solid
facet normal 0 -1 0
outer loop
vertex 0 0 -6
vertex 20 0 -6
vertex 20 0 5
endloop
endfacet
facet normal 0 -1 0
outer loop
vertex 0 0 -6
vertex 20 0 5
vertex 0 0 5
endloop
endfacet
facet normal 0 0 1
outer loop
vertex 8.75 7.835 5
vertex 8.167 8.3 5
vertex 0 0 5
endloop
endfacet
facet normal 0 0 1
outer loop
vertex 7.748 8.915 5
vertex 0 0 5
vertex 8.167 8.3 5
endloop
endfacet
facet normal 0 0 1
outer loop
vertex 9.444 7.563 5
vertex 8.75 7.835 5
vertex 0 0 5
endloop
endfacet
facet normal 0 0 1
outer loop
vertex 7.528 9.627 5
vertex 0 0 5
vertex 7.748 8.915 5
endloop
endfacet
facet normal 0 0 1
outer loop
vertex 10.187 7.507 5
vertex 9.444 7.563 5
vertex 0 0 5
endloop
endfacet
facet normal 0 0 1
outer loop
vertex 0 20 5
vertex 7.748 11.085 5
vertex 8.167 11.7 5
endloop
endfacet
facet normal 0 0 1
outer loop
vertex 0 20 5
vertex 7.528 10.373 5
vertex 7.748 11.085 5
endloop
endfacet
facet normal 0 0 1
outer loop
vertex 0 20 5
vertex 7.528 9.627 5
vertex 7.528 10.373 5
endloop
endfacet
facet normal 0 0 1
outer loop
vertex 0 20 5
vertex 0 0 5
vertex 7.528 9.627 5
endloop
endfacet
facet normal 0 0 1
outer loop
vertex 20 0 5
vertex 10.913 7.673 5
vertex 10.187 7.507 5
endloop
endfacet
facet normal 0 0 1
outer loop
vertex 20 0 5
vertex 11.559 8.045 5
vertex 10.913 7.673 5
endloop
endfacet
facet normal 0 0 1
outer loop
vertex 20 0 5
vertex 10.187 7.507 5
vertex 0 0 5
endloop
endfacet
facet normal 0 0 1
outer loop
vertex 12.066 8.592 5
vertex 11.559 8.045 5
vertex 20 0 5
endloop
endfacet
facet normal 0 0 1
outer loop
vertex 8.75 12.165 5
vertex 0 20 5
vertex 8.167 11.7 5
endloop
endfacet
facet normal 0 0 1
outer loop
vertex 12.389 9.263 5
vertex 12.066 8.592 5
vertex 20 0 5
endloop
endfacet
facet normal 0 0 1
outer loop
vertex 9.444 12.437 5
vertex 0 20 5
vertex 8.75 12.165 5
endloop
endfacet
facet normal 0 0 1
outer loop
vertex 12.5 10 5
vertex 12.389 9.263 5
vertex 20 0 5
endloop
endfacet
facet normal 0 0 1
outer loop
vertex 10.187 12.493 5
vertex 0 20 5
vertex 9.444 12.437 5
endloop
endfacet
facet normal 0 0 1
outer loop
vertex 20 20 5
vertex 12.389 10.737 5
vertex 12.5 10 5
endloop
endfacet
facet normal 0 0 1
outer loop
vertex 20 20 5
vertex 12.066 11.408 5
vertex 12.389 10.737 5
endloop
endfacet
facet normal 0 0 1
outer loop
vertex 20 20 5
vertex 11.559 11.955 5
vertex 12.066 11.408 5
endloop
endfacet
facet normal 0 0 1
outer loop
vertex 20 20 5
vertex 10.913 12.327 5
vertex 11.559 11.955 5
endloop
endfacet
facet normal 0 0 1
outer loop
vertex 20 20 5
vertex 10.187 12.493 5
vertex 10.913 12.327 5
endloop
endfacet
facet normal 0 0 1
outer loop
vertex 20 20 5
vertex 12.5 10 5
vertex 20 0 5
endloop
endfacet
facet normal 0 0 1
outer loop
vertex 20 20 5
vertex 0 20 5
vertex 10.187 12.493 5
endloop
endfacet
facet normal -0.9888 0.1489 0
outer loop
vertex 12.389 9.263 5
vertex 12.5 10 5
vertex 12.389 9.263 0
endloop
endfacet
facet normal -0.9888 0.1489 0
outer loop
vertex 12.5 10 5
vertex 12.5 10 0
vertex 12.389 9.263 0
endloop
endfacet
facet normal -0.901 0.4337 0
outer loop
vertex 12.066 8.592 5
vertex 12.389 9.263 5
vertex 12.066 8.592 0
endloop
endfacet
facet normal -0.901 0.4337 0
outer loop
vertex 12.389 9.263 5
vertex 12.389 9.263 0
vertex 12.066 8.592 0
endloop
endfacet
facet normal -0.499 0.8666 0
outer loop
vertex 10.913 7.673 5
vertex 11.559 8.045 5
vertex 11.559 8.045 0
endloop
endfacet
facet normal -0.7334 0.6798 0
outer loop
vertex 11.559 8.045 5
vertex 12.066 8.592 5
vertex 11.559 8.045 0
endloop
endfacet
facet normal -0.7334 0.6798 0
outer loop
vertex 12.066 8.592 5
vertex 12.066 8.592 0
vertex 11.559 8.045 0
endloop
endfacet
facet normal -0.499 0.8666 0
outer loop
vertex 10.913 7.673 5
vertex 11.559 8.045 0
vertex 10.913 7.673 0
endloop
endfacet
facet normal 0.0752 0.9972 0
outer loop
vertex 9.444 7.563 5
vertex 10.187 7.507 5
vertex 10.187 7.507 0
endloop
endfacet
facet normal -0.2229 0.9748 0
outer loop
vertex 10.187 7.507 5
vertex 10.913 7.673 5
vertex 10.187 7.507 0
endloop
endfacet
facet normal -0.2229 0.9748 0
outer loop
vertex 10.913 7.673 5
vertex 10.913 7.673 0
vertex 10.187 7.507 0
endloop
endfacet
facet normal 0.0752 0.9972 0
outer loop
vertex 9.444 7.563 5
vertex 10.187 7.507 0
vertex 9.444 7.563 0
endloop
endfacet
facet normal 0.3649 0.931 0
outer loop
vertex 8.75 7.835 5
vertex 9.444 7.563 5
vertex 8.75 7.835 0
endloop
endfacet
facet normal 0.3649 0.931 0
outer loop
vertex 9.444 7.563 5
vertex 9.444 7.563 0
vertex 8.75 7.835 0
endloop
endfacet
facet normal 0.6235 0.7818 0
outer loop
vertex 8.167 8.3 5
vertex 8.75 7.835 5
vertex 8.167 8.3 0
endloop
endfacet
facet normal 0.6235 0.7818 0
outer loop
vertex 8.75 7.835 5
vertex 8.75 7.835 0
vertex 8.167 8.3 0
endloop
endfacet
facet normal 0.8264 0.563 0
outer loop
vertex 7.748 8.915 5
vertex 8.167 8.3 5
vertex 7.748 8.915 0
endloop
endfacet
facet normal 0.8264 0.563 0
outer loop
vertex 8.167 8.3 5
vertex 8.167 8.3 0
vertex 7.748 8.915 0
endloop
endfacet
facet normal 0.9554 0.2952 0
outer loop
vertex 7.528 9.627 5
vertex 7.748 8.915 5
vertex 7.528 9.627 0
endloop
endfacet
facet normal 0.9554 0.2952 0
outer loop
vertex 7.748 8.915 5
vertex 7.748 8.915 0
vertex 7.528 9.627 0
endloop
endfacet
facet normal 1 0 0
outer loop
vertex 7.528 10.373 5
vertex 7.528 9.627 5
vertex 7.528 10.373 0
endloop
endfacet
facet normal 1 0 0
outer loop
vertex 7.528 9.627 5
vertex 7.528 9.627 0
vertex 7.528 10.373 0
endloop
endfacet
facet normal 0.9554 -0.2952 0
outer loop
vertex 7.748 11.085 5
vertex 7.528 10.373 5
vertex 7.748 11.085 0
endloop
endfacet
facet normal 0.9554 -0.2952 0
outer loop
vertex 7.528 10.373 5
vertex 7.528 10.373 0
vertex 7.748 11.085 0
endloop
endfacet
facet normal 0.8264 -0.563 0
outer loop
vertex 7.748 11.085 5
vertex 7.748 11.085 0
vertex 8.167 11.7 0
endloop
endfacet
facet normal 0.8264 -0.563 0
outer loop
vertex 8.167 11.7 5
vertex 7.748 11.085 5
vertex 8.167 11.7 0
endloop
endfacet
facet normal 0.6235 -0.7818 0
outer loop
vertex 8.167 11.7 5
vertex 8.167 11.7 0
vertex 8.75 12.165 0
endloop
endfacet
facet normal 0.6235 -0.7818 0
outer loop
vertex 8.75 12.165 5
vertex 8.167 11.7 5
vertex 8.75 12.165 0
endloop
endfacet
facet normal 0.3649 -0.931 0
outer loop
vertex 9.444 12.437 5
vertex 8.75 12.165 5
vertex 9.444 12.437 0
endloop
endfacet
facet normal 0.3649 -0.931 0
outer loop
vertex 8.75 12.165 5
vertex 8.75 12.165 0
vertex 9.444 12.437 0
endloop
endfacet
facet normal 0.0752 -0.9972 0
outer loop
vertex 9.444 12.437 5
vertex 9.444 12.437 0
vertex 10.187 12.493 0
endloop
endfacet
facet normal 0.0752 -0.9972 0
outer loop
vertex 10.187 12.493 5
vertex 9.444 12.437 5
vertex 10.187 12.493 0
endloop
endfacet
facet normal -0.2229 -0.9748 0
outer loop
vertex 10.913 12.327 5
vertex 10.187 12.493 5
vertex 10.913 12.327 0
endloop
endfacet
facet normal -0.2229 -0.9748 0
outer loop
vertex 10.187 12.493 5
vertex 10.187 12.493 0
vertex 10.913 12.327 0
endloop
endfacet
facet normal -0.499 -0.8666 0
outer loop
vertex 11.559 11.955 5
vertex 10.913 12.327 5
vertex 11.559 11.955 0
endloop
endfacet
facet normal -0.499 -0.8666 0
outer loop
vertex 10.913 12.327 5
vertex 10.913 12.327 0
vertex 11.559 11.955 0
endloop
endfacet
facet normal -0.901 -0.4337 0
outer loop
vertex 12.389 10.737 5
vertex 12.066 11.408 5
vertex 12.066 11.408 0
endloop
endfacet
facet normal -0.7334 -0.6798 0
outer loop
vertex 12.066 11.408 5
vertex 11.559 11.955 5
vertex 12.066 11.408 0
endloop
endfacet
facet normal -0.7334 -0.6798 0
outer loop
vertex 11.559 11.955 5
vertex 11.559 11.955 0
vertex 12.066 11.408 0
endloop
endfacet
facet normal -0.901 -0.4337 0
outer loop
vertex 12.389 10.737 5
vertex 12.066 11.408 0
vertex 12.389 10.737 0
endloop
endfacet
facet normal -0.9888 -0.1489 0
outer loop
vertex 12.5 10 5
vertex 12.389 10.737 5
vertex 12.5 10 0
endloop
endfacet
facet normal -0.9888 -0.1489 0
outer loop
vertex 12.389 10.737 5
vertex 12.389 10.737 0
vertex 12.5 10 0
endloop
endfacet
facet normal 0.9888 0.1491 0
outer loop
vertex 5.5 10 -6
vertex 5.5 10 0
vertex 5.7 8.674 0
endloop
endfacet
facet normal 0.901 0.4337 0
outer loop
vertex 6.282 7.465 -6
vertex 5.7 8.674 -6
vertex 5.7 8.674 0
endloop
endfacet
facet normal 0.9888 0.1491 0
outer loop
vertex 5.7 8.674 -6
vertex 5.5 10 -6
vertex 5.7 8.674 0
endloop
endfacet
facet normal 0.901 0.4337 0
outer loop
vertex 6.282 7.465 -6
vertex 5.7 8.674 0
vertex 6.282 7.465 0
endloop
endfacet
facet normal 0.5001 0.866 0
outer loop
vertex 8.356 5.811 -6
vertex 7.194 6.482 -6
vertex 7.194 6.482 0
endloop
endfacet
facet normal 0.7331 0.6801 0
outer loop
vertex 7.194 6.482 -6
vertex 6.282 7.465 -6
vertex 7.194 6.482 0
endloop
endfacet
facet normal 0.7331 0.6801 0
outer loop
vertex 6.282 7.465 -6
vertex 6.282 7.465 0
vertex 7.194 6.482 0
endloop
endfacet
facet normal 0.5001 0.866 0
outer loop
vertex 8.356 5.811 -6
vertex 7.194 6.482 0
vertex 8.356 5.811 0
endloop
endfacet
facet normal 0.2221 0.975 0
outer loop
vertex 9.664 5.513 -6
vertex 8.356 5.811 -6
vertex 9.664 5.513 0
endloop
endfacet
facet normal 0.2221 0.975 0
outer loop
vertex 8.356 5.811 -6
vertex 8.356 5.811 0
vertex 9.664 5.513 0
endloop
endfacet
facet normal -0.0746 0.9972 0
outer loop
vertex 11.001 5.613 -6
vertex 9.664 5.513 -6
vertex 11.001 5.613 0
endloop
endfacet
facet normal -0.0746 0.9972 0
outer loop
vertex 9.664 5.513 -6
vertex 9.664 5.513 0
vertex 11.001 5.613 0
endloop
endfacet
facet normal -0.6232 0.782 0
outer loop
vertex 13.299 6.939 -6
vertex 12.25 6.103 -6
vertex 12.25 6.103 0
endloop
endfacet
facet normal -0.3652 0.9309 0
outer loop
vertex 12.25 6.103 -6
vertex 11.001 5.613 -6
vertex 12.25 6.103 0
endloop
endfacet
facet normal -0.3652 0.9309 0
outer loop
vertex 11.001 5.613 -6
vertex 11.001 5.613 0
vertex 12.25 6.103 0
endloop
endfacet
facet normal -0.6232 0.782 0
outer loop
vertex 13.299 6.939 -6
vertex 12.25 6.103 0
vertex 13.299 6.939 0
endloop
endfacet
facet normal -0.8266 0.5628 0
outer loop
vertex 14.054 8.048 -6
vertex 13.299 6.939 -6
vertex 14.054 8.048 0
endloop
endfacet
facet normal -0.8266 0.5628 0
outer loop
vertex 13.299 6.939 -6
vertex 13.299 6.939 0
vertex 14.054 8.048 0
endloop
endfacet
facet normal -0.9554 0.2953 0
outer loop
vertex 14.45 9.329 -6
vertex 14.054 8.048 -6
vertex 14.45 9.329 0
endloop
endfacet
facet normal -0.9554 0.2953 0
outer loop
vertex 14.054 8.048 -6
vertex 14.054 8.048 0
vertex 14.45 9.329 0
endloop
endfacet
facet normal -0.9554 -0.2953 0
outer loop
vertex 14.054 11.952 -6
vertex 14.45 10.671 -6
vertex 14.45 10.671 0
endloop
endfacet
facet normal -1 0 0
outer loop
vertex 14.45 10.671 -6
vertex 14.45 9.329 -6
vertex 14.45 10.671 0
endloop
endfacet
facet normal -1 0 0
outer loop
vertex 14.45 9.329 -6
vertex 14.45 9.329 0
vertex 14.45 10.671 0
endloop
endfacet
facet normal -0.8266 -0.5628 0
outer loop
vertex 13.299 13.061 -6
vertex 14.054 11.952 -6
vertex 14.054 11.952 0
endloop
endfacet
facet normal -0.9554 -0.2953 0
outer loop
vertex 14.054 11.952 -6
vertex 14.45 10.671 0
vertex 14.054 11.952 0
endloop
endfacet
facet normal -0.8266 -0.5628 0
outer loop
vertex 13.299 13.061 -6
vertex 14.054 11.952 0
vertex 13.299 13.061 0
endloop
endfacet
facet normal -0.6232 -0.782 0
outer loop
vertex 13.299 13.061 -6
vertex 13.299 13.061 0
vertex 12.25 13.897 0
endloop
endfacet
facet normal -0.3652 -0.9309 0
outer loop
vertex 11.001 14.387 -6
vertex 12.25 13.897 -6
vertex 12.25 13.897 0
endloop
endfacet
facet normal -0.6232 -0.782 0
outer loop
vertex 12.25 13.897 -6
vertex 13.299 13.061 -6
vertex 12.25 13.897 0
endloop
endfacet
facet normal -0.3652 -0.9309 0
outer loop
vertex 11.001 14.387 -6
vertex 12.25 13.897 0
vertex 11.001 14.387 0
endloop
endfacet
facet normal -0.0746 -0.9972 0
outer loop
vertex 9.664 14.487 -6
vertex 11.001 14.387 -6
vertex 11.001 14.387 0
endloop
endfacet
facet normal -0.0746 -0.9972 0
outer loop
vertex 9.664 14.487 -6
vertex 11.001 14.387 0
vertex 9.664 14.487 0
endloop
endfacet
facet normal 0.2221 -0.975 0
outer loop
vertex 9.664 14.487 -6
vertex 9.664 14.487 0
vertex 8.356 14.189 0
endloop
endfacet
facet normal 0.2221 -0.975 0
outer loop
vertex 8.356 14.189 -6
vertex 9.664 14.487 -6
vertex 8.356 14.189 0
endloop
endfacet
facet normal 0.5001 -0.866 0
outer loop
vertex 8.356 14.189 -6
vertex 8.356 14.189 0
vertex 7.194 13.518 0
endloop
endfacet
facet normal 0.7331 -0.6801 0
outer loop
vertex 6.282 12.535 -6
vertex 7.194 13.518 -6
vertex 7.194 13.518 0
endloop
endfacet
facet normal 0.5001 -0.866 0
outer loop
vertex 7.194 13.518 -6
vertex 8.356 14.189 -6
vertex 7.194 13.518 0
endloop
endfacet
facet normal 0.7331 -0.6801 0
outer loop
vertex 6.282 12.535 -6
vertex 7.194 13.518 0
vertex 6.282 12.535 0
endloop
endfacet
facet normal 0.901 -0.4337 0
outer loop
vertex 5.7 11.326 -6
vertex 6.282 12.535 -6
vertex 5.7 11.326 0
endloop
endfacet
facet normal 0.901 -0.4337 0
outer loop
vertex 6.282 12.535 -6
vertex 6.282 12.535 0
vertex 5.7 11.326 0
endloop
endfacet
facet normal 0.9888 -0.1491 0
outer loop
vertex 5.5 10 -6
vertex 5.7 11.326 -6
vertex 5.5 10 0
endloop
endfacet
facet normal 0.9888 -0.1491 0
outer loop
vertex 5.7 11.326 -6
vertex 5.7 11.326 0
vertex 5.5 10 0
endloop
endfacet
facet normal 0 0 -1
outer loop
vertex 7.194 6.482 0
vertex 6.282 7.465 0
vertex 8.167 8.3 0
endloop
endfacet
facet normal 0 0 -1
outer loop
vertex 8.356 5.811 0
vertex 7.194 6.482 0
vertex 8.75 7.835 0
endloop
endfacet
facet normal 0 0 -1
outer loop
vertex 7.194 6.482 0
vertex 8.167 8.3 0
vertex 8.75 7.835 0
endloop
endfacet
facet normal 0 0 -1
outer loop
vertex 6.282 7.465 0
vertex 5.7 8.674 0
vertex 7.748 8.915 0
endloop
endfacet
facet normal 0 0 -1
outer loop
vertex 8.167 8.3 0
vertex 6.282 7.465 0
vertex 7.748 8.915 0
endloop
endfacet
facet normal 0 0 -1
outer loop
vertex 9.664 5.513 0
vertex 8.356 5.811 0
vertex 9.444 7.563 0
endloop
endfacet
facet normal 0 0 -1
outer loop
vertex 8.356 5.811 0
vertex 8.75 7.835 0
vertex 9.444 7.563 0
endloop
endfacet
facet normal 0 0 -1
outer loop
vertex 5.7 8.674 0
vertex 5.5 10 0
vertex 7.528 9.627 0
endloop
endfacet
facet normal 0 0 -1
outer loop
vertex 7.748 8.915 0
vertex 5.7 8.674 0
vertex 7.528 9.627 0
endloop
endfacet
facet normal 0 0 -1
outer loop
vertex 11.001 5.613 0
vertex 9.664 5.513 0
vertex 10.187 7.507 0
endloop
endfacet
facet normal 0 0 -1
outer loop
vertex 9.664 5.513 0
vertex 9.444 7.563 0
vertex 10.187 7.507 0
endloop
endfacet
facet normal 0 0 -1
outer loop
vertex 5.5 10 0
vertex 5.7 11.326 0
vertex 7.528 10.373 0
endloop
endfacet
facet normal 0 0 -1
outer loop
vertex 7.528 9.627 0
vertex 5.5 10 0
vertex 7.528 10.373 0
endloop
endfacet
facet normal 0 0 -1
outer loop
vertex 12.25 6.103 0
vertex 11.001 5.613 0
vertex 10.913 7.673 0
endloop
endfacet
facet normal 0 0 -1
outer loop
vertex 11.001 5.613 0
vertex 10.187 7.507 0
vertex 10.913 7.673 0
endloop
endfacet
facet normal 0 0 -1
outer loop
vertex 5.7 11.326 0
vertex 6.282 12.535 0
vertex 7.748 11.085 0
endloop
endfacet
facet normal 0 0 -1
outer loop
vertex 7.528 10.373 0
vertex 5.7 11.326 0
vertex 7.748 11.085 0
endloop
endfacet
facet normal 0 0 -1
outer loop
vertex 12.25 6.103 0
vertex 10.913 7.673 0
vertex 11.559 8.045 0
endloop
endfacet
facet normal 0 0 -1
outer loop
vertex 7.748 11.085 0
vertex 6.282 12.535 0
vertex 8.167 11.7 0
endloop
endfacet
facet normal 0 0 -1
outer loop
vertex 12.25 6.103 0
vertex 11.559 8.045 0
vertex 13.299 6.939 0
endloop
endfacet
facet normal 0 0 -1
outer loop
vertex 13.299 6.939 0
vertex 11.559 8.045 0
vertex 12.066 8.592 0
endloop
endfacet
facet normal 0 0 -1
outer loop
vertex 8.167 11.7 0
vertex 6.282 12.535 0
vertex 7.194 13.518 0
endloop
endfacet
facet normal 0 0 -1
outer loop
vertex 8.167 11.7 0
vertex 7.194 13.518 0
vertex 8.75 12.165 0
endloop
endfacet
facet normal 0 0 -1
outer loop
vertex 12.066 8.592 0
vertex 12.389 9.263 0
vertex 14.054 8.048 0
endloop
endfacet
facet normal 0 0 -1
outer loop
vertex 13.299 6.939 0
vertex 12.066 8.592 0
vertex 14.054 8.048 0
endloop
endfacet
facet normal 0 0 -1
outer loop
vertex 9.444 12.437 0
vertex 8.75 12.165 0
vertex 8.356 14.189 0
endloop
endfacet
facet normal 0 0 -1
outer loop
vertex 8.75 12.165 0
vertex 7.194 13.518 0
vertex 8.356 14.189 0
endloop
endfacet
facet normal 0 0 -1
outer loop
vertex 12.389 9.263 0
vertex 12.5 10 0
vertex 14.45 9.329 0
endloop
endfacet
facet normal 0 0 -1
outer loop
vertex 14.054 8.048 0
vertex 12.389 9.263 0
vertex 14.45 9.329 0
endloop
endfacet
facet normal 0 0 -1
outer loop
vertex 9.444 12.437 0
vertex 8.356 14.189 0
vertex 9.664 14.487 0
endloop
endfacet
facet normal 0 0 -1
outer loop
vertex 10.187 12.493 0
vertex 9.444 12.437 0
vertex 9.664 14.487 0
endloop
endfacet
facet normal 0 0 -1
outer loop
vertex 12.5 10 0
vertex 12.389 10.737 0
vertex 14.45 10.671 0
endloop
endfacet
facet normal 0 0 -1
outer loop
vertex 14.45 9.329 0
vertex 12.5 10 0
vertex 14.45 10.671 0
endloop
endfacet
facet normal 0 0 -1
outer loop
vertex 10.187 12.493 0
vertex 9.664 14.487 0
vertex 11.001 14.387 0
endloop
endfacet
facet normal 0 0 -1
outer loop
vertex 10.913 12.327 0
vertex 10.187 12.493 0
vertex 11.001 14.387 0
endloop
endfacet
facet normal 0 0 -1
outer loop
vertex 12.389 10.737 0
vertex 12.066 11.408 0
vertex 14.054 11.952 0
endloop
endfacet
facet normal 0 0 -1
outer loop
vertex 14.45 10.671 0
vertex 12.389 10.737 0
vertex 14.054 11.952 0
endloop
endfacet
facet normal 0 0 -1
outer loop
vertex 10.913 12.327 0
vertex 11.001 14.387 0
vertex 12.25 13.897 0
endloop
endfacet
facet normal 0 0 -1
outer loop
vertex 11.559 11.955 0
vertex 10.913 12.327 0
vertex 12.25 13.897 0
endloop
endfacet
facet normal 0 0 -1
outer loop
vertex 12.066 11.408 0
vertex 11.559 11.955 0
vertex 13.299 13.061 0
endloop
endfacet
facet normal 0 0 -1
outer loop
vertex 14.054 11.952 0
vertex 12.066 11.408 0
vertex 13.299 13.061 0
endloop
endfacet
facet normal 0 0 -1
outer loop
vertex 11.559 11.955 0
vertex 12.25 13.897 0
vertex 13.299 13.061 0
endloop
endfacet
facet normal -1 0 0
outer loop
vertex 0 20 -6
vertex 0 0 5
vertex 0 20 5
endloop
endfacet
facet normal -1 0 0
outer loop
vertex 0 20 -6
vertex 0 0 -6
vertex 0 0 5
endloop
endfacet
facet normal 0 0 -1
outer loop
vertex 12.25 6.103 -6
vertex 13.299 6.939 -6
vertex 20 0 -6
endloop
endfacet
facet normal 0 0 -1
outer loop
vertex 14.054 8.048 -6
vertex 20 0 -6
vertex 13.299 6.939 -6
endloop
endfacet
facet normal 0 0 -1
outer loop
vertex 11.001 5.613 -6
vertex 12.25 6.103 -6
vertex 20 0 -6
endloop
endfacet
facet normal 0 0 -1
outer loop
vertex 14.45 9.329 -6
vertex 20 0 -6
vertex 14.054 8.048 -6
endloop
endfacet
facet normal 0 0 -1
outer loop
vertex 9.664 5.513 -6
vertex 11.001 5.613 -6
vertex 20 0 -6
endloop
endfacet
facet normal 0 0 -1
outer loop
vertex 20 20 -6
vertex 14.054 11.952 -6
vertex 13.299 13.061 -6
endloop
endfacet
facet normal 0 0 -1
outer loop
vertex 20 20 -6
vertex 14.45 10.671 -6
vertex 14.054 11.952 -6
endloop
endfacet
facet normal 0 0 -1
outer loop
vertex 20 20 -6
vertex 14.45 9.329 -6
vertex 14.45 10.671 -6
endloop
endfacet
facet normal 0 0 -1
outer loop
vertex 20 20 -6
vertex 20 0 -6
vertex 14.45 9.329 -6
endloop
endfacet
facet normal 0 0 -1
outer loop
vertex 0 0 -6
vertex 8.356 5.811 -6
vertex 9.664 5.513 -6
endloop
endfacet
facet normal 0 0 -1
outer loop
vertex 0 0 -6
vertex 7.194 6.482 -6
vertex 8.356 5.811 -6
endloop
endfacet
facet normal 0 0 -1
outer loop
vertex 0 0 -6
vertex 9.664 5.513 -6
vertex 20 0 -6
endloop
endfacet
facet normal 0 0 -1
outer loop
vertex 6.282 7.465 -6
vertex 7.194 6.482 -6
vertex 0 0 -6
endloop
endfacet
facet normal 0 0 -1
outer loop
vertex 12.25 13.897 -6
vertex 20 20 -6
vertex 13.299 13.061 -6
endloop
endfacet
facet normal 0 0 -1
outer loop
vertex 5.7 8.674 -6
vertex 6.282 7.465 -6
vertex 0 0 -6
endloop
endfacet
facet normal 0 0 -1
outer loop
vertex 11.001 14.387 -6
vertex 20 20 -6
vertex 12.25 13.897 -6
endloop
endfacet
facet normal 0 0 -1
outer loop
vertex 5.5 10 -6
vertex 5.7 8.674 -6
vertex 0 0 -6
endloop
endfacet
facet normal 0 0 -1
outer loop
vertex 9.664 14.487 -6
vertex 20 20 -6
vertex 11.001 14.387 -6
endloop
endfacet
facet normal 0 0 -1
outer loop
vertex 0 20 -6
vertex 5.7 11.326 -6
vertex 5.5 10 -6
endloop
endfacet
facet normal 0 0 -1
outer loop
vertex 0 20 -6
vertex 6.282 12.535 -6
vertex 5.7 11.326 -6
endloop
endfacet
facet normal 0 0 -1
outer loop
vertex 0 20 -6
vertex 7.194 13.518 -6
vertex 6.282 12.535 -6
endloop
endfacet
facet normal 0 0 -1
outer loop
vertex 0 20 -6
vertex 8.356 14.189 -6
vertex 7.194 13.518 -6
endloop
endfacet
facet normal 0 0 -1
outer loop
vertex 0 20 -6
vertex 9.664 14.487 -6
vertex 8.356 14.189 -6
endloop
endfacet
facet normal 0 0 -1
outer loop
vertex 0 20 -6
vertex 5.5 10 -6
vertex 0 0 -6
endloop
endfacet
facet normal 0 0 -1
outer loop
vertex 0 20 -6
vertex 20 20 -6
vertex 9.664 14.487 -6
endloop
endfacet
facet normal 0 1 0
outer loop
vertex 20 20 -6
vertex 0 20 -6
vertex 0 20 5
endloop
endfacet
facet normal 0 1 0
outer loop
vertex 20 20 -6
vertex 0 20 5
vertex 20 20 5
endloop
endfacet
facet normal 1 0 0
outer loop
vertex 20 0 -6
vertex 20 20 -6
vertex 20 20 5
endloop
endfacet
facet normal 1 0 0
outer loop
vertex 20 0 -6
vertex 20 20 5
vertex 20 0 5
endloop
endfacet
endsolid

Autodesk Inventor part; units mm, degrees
ref_plane "YZ Plane" through (0, 0, 0) normal (1, 0, 0) x (0, 1, 0)
ref_plane "XZ Plane" through (0, 0, 0) normal (0, 1, 0) x (-1, 0, 0)
ref_plane "XY Plane" through (0, 0, 0) normal (0, 0, 1) x (1, 0, 0)
sketch "Sketch1" plane through (0, 0, 0) normal (0, 0, 1) x (1, 0, 0)
  line L0 (0, 20) -> (20, 20)
  line L1 (20, 20) -> (20, 0)
  line L2 (20, 0) -> (0, 0)
  line L3 (0, 0) -> (0, 20)
  circle A0 centre (10, 10) radius 2.5
  dimension "d0" = 20
  dimension "d1" = 20
  dimension "d5" = 10
  dimension "d6" = 10
  dimension "d7" = 5
extrude "Extrusion2" add sketch "Sketch1" along normal blind 5
sketch "Sketch3" plane through (0, 0, 0) normal (0, 0, -1) x (-1, 0, 0)
  line L0 (-20, 20) -> (0, 20) projected
  line L1 (0, 20) -> (0, 0) projected
  line L2 (-20, 20) -> (0, 20)
  line L3 (0, 20) -> (0, 0)
  line L4 (0, 0) -> (-20, 0)
  line L5 (-20, 0) -> (-20, 20)
  circle A0 centre (-10, 10) radius 4.5
  dimension "d10" = 9
extrude "Extrusion3" add sketch "Sketch3" along normal blind 6
equation "\"d1\" = d0"
equation "\"d5\" = 0.5 * d0"
equation "\"d6\" = d5"
properties part number "Touchscreen mount v04 screw test"
